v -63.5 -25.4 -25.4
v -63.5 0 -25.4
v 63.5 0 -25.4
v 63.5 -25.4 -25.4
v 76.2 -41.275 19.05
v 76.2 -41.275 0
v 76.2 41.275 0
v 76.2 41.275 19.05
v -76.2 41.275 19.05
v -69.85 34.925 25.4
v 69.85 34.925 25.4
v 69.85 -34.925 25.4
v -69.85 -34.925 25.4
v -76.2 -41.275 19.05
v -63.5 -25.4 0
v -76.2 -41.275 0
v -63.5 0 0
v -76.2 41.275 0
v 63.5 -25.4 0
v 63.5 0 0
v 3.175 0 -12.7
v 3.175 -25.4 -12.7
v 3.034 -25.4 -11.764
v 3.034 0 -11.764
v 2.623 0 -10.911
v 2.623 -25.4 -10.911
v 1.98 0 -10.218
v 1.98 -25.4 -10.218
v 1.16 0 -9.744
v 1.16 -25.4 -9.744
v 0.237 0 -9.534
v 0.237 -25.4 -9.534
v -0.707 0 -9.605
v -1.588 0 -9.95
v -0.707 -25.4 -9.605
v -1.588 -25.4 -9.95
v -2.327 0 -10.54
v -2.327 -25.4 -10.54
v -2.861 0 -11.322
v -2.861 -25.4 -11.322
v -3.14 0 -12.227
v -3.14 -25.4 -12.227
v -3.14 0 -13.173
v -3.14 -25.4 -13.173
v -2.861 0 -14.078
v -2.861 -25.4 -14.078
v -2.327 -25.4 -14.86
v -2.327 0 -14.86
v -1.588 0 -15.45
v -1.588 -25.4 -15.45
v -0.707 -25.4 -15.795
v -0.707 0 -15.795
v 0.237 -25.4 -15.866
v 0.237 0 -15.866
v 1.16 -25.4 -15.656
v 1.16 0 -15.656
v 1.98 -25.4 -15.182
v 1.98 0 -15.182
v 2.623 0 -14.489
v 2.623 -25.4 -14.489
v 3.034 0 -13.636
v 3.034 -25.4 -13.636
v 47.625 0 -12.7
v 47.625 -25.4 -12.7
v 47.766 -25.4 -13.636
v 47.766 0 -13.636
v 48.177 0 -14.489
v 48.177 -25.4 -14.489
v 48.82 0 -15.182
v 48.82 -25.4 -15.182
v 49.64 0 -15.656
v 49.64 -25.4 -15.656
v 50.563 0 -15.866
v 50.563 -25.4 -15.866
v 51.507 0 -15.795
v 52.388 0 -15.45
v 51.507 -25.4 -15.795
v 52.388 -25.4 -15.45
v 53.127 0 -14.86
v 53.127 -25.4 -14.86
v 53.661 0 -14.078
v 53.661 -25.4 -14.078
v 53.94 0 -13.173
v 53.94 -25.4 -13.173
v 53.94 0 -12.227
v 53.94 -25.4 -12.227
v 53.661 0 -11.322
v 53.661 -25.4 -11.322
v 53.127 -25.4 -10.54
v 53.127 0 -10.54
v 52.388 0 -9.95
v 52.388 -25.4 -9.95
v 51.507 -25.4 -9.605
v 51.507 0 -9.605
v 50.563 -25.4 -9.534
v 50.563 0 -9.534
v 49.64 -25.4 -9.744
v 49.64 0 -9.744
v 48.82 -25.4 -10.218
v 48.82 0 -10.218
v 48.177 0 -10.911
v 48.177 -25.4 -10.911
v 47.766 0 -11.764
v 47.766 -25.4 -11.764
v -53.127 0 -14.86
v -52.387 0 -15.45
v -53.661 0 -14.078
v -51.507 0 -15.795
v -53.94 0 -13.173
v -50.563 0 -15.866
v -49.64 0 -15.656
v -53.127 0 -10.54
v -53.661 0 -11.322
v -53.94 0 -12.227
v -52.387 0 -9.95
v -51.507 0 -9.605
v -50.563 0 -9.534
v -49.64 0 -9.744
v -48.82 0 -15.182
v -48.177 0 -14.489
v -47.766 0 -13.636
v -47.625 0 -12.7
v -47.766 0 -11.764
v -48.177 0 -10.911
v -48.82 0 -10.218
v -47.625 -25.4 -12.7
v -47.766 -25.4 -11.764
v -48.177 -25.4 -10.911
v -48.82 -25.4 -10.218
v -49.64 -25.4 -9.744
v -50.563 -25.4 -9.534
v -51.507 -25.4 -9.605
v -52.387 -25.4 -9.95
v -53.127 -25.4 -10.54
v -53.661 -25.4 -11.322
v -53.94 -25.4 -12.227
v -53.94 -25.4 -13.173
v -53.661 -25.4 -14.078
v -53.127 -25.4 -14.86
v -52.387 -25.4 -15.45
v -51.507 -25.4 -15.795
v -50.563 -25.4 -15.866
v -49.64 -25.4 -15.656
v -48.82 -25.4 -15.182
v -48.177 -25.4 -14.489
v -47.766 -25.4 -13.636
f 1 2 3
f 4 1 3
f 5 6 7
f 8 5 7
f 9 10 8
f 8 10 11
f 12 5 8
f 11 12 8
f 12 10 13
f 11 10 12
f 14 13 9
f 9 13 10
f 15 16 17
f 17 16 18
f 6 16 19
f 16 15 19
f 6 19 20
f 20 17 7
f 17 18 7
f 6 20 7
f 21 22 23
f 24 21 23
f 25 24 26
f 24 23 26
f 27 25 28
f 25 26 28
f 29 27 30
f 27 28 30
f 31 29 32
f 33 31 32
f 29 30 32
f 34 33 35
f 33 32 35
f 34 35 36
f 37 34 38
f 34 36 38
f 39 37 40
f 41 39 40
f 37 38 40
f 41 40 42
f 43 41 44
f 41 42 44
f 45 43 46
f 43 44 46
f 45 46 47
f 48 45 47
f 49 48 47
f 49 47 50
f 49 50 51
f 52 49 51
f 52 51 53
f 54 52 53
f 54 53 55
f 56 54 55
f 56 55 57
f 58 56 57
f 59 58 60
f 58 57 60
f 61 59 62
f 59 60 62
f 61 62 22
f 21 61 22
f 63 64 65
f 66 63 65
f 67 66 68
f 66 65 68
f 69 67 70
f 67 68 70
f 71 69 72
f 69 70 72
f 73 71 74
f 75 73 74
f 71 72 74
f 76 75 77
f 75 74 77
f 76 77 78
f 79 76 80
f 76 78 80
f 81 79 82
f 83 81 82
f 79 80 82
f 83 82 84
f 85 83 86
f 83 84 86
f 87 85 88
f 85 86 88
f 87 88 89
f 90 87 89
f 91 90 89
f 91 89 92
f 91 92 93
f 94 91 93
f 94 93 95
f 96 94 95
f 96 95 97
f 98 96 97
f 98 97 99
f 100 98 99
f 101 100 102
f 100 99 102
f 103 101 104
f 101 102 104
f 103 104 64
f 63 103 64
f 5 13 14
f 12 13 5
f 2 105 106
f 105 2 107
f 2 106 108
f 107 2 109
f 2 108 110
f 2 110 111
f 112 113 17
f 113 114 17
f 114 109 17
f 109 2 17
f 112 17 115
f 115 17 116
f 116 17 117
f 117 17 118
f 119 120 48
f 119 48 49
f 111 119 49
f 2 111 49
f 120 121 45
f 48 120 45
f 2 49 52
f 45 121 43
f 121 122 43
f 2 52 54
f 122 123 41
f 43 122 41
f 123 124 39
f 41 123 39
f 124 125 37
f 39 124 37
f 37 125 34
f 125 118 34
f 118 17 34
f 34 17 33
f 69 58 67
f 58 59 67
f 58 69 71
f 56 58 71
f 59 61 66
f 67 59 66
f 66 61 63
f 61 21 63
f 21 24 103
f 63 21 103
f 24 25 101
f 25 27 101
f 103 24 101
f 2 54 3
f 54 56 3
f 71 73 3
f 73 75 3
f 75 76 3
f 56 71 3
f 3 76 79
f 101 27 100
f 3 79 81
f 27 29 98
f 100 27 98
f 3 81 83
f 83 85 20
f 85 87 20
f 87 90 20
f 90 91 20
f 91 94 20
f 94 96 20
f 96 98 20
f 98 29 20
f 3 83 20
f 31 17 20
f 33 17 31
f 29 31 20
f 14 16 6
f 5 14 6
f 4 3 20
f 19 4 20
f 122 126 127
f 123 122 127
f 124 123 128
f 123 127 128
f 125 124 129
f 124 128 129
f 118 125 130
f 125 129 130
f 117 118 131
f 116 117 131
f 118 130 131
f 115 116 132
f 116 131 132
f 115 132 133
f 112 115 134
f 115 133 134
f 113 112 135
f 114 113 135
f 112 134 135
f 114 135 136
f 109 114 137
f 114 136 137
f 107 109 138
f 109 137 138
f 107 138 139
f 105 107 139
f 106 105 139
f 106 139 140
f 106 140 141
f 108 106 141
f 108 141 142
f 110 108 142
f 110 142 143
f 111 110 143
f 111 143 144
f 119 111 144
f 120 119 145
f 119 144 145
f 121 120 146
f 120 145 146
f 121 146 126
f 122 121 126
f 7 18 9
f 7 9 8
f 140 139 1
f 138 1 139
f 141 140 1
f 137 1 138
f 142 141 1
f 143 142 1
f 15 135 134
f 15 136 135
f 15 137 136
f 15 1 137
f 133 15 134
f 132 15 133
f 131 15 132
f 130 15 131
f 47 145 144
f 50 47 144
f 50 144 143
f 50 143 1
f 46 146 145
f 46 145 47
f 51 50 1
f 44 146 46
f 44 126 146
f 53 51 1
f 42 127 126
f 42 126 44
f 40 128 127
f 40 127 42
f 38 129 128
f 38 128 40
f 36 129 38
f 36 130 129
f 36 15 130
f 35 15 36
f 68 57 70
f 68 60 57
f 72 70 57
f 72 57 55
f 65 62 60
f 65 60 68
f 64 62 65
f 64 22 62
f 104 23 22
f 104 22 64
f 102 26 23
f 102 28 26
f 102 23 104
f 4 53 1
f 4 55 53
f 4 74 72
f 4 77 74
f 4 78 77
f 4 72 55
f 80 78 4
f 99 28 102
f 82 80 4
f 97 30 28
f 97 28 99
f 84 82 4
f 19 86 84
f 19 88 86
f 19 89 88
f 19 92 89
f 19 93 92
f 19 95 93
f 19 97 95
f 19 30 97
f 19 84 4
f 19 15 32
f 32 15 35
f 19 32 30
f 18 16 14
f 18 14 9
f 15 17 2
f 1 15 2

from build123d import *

# Parameters (mm, degrees)
F0_W     = 152.4
F0_H     = 82.55
F1_DEPTH = 25.4
F3_DEPTH = 25.4
F4_R     = 3.175
F5_DEPTH = 25.4
F6_SIZE  = 6.35


with BuildPart() as f1:
    # F0 (on Top) → F1 (new body)
    with BuildSketch(Plane.XY):
        Rectangle(F0_W, F0_H)
    extrude(amount=F1_DEPTH)

    # F2 (on Front) → F3 (join)
    with BuildSketch(Plane.XZ):
        Polygon((63.5, 0), (0, 0), (-63.5, 0), (-63.5, -25.4), (63.5, -25.4), align=None)
    extrude(amount=F3_DEPTH)

    # F4 (on face) → F5 (cut)
    with BuildSketch(Plane.XZ.offset(25.4)):
        with BuildLine():
            Line((3.175, -12.7), (0, -12.7))
            Line((0, -12.7), (-3.175, -12.7))
            ThreePointArc((-3.175, -12.7), (0, -15.875), (3.175, -12.7))
        make_face()
        with BuildLine():
            Line((-3.175, -12.7), (0, -12.7))
            Line((0, -12.7), (3.175, -12.7))
            ThreePointArc((3.175, -12.7), (0, -9.525), (-3.175, -12.7))
        make_face()
        with Locations((-50.8, -12.7)):
            Circle(F4_R)
        with BuildLine():
            ThreePointArc((53.975, -12.7), (50.8, -9.525), (47.625, -12.7))
            ThreePointArc((47.625, -12.7), (50.8, -15.875), (53.975, -12.7))
        make_face()
    extrude(amount=-F5_DEPTH, mode=Mode.SUBTRACT)

    # F6
    f6_edges = [f1.edges().sort_by_distance(p)[0] for p in [
        (0, 41.275, 25.4),
        (-76.2, 0, 25.4),
        (0, -41.275, 25.4),
        (76.2, 0, 25.4),
    ]]
    chamfer(f6_edges, length=F6_SIZE)


solid = f1.part
